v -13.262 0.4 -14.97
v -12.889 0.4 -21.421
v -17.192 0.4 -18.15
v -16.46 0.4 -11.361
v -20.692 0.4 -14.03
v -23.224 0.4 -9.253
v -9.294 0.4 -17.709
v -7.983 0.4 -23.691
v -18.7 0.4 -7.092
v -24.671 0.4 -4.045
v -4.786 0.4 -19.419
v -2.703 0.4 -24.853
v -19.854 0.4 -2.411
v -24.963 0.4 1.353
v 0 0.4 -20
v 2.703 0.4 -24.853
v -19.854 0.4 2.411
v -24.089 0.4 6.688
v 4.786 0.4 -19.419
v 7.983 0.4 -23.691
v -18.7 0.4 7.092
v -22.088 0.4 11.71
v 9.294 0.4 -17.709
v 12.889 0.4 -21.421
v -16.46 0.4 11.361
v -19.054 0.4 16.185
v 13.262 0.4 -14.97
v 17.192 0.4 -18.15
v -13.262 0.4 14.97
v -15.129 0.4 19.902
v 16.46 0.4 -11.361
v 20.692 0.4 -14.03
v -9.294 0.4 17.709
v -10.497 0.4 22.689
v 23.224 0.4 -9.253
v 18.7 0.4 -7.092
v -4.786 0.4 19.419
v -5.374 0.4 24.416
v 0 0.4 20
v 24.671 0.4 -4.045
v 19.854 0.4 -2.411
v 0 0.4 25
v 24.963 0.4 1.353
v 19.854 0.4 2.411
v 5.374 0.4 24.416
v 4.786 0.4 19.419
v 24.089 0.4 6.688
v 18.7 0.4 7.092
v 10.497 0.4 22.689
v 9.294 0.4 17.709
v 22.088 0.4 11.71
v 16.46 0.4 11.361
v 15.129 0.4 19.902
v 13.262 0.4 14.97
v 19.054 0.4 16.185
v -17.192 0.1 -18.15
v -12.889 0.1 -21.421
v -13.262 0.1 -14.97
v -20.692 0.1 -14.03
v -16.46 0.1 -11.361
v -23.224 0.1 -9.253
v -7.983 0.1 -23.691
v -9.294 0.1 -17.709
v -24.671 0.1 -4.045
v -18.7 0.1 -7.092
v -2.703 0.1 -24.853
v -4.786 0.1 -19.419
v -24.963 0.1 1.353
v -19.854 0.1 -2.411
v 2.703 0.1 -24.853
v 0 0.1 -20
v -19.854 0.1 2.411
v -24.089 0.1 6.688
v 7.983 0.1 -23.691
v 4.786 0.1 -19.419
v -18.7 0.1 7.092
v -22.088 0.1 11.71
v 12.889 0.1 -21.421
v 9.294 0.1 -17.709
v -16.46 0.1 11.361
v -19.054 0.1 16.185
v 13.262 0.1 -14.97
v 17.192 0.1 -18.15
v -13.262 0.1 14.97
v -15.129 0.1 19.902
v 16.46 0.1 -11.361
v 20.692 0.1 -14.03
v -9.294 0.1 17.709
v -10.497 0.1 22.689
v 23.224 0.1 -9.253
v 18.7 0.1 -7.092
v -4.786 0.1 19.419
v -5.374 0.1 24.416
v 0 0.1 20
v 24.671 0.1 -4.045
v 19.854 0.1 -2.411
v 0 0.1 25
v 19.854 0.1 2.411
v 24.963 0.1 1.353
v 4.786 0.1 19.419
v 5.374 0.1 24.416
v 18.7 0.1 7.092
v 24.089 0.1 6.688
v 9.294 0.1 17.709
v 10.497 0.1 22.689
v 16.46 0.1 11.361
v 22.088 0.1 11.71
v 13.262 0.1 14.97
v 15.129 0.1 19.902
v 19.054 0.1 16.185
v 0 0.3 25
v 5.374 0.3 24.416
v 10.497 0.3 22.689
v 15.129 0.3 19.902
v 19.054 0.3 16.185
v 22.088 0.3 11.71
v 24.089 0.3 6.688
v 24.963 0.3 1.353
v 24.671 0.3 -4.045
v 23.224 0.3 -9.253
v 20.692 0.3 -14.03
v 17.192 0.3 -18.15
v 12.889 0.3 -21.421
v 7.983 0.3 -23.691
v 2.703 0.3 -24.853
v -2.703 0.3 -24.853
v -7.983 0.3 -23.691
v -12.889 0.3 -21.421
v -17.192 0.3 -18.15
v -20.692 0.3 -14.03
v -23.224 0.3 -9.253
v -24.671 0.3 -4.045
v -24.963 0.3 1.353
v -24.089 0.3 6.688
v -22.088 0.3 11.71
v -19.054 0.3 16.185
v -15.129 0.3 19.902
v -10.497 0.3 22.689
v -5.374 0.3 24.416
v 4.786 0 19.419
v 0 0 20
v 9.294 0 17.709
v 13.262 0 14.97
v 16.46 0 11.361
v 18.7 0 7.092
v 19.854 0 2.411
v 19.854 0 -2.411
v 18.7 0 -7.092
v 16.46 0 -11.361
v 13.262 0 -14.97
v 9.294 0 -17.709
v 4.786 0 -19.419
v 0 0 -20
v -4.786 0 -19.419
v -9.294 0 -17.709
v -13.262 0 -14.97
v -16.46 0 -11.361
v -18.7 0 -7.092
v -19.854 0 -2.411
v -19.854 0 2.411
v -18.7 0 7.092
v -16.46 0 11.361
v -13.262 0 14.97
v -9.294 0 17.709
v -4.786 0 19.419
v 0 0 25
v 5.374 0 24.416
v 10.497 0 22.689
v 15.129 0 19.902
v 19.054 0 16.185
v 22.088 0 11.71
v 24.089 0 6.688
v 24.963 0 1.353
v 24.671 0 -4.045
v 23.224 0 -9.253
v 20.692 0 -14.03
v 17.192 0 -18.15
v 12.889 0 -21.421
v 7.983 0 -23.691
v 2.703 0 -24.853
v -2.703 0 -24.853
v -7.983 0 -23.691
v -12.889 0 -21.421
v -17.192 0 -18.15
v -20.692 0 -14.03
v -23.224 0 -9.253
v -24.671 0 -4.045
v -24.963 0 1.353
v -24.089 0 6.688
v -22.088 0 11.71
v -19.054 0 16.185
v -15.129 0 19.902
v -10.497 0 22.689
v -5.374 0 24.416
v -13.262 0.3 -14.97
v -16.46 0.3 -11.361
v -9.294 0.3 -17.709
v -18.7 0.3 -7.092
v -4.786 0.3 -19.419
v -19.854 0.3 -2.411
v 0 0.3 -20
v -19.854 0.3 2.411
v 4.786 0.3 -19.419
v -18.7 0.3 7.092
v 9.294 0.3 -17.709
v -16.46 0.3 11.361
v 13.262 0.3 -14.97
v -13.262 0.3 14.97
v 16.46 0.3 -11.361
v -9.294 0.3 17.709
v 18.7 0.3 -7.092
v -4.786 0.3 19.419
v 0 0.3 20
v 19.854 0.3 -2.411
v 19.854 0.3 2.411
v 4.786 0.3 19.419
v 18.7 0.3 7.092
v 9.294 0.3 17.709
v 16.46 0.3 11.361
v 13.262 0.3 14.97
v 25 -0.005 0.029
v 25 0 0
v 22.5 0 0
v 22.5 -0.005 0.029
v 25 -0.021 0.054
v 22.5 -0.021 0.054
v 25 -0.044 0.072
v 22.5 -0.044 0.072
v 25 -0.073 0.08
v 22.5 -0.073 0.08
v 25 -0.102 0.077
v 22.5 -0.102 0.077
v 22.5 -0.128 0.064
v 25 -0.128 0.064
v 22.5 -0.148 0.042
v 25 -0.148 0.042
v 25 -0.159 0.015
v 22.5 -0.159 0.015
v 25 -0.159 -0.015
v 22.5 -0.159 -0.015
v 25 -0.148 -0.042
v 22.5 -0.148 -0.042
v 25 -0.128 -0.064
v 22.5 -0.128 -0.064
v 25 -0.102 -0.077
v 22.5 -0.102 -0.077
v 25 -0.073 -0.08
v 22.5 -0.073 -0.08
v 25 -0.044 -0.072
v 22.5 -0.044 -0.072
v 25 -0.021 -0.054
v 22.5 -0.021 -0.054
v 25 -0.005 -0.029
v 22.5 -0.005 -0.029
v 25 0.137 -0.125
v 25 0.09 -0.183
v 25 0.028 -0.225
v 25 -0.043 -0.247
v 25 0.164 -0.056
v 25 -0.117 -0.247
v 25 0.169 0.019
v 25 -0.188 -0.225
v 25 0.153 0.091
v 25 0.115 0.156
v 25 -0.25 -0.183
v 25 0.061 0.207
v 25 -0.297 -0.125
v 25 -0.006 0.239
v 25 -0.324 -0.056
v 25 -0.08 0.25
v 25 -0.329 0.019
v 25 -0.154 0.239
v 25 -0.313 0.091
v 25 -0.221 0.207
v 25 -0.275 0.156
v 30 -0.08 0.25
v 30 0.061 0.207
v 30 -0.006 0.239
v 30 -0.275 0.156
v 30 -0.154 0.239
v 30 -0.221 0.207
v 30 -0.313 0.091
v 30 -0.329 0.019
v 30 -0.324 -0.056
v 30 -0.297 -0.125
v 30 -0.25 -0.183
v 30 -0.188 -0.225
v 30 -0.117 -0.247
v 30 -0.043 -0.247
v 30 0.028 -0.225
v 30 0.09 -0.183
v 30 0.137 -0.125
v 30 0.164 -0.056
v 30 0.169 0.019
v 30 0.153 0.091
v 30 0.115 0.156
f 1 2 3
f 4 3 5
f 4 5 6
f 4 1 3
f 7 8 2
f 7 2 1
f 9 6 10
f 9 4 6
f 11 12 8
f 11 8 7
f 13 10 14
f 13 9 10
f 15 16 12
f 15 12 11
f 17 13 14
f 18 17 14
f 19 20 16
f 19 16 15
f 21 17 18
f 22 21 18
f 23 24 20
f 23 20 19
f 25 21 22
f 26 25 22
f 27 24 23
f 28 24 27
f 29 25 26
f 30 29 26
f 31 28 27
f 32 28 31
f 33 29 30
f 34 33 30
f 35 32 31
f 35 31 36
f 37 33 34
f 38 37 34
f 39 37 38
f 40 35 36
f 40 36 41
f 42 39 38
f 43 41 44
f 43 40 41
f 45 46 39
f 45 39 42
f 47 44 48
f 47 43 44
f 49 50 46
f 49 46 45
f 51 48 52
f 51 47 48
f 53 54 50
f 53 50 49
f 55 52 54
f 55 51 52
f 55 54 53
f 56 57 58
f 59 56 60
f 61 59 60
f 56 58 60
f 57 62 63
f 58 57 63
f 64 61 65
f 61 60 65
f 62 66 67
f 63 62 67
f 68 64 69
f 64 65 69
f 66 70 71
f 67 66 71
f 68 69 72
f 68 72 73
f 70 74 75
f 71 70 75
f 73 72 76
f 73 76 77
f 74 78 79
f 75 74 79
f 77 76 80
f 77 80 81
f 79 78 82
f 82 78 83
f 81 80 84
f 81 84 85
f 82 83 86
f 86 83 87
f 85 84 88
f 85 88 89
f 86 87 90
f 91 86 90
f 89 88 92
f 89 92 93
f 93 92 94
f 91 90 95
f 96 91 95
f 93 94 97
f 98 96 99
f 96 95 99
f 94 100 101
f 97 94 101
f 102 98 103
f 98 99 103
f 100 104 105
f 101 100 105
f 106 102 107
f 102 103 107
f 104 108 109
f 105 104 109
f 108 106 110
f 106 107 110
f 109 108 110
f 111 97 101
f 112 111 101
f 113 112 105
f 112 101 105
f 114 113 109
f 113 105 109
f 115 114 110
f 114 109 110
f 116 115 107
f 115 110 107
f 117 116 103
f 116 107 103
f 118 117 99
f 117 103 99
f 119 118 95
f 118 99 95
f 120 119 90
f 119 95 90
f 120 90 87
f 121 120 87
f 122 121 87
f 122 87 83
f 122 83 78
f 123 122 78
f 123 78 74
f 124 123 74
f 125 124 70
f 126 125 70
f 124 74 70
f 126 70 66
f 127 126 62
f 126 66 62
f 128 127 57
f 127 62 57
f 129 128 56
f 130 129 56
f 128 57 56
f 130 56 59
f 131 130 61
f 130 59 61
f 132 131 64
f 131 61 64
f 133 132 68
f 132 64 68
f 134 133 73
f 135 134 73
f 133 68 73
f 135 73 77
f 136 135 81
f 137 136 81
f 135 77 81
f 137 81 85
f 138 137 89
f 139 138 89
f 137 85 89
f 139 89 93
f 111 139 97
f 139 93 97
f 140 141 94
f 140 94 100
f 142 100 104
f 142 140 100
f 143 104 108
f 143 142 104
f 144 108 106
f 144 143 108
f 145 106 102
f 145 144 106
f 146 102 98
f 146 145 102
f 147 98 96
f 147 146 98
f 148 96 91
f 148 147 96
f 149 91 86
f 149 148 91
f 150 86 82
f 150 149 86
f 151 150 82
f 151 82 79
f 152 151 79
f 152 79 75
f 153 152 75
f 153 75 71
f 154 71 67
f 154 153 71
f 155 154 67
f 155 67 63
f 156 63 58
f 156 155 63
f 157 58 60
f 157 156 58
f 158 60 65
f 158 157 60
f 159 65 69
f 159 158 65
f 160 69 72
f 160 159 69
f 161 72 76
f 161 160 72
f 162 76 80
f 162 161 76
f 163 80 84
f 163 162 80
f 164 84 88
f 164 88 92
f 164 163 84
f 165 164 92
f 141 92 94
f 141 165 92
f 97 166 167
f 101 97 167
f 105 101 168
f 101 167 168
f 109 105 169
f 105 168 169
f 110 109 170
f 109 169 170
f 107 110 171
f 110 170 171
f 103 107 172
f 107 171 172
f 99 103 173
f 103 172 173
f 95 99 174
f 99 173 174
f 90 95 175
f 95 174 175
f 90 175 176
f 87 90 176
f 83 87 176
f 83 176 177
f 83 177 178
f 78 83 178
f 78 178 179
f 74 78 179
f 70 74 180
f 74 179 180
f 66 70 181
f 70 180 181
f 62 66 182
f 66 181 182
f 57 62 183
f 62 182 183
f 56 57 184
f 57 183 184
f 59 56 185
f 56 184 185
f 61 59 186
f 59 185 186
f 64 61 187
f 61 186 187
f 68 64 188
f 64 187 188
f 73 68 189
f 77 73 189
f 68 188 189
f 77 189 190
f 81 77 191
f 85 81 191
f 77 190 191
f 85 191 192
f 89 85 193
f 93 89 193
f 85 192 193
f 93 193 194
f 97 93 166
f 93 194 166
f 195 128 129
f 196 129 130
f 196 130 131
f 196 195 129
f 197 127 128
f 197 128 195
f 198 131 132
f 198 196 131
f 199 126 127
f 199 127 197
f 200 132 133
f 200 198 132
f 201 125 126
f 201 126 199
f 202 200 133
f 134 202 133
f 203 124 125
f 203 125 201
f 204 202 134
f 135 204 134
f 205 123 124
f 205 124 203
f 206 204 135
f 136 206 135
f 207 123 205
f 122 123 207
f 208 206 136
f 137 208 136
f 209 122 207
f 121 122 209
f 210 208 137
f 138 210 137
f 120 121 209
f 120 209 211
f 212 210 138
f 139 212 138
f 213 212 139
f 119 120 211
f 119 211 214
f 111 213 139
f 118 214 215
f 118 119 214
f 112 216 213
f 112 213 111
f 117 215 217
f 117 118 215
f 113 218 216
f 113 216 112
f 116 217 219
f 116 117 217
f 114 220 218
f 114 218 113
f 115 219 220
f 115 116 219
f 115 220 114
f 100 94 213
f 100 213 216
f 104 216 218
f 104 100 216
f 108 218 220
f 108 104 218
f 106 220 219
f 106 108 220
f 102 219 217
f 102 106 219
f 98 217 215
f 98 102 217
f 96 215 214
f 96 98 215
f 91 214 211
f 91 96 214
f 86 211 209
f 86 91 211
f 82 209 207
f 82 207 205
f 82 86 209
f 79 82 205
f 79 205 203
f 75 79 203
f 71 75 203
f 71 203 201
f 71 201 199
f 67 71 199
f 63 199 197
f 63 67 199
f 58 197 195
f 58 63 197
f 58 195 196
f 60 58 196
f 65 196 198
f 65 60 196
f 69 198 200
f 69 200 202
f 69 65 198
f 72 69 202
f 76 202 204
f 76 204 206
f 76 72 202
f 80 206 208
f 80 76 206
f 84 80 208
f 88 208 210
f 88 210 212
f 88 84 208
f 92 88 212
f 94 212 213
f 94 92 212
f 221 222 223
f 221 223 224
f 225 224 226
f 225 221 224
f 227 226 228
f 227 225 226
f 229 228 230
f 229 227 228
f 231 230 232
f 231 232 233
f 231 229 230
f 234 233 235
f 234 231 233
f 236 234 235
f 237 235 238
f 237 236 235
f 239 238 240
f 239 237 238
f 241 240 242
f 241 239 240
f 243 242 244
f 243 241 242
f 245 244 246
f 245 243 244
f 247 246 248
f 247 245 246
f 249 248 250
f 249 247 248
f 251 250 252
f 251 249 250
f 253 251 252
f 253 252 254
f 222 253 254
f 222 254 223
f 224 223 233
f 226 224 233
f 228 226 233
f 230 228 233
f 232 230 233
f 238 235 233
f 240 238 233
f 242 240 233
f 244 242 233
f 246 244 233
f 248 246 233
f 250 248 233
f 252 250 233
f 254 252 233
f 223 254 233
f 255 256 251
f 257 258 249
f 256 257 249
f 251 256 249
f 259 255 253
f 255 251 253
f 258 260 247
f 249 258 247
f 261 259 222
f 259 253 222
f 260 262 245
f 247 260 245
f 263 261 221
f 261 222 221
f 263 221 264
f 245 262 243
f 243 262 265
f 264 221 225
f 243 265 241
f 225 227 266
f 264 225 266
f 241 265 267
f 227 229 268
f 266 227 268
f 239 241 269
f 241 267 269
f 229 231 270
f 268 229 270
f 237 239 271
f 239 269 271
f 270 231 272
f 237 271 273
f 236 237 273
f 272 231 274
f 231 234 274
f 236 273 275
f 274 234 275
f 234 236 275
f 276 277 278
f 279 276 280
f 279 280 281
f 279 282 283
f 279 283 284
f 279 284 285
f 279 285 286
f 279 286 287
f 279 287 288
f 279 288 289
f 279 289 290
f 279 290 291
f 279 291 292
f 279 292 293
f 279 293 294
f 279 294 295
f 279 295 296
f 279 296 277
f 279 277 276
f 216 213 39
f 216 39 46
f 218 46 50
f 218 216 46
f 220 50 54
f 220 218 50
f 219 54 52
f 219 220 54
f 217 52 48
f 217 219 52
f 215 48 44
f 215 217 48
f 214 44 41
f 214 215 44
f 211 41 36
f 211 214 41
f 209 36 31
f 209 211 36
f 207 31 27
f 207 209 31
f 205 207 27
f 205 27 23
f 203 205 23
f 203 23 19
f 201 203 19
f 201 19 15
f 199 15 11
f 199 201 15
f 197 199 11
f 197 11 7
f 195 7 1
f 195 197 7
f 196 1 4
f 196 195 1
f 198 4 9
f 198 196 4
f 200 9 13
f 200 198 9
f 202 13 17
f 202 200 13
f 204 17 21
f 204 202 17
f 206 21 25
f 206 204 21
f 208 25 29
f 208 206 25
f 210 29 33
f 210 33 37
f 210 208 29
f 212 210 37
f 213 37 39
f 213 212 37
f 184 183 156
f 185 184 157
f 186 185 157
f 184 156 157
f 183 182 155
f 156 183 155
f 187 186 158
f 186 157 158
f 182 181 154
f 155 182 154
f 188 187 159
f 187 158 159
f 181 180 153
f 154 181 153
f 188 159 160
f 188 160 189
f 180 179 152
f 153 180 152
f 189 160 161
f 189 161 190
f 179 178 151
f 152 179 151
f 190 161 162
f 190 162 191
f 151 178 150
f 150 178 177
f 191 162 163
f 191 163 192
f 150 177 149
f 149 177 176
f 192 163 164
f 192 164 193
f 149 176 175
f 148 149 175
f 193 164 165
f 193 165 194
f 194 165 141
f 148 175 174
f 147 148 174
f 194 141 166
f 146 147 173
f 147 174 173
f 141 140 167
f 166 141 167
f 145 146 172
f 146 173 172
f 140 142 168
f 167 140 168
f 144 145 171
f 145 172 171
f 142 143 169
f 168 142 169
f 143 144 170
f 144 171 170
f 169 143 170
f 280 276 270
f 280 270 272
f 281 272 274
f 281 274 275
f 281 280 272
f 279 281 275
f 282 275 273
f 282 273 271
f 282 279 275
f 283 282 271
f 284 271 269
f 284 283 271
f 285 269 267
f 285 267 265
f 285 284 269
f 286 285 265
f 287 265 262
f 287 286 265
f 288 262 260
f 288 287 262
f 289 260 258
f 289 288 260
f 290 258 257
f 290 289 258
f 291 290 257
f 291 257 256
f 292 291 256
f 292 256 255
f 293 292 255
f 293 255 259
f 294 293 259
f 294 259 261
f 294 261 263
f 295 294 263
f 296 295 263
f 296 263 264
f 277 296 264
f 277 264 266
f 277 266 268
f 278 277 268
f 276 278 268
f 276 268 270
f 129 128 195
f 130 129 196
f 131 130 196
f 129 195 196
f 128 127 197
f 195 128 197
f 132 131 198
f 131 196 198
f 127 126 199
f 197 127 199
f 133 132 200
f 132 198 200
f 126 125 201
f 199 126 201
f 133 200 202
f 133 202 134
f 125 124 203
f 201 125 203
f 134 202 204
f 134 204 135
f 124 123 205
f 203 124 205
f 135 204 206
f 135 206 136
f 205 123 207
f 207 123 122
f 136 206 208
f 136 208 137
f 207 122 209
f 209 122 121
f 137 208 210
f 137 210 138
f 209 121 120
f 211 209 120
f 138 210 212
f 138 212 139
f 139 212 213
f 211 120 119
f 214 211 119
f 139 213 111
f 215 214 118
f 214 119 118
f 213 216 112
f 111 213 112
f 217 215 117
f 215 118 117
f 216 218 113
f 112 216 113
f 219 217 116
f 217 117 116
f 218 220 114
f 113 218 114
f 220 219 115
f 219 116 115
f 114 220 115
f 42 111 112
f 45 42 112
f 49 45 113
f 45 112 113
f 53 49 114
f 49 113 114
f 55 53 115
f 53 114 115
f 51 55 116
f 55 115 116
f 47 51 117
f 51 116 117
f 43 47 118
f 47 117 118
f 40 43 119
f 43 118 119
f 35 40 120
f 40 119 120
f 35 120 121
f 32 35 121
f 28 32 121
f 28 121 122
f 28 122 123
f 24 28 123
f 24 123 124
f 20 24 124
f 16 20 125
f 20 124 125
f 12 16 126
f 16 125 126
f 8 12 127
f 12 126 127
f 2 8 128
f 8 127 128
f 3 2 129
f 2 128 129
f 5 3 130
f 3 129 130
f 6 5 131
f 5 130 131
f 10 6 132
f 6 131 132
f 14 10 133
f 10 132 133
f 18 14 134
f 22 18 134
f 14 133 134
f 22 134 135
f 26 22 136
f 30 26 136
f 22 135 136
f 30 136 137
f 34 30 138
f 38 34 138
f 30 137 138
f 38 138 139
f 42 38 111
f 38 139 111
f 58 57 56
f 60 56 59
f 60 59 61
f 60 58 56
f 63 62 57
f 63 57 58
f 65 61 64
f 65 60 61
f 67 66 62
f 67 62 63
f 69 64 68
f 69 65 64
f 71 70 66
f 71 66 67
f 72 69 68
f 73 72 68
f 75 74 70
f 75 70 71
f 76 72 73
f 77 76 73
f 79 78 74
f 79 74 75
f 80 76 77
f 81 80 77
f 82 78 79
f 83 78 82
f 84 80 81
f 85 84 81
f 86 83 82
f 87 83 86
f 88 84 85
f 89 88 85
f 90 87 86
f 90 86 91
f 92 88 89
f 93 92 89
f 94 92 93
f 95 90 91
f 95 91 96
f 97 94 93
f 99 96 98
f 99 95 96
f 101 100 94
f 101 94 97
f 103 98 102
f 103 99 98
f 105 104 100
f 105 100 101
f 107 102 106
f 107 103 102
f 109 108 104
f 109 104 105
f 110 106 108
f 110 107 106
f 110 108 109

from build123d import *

# Parameters (mm, degrees)
SKETCH1_R           = 25
SKETCH1_R_2         = 20
BOSS_EXTRUDE1_DEPTH = 0.1
SWEEP1_PROFILE_R    = 0.08
SWEEP2_PROFILE_R    = 0.25
SKETCH18_R          = 25
SKETCH18_R_2        = 20
BOSS_EXTRUDE2_DEPTH = 0.2
SKETCH19_R          = 25
SKETCH19_R_2        = 20
BOSS_EXTRUDE3_DEPTH = 0.1


with BuildPart() as part:
    # Sketch1 → Boss-Extrude1 (new body)
    with BuildSketch(Plane(origin=(0, 0, 0), x_dir=(1, 0, 0), z_dir=(0, 1, 0))):
        with Locations(Location((0, 0, 0), (0, 0, 270))):
            Circle(SKETCH1_R)
        with Locations(Location((0, 0, 0), (0, 0, 270))):
            Circle(SKETCH1_R_2, mode=Mode.SUBTRACT)
    extrude(amount=BOSS_EXTRUDE1_DEPTH)


with BuildPart() as body_2:
    # Sweep1: sweep along a path in Sketch2
    with BuildLine(Plane.XY) as sweep1_path:
        Line((22.5, -0.08), (25, -0.08))
    # Sweep1 profile (on start of the path) → Sweep1 (sweep)
    with BuildSketch(Plane(origin=(22.5, -0.08, 0), x_dir=(0, 1, 0), z_dir=(1, 0, 0))):
        Circle(SWEEP1_PROFILE_R)
    sweep(path=sweep1_path.line)

    # Sweep2: sweep along a path in Sketch11
    with BuildLine(Plane.XY) as sweep2_path:
        Line((25, -0.08), (30, -0.08))
    # Sweep2 profile (on start of the path) → Sweep2 (sweep)
    with BuildSketch(Plane(origin=(25, -0.08, 0), x_dir=(0, 0, 1), z_dir=(1, 0, 0))):
        Circle(SWEEP2_PROFILE_R)
    sweep(path=sweep2_path.line)


with BuildPart() as body_3:
    # Sketch18 → Boss-Extrude2 (new body)
    with BuildSketch(Plane(origin=(0, 0.1, 0), x_dir=(1, 0, 0), z_dir=(0, 1, 0))):
        with Locations(Location((0, 0, 0), (0, 0, 270))):
            Circle(SKETCH18_R)
        with Locations(Location((0, 0, 0), (0, 0, 270))):
            Circle(SKETCH18_R_2, mode=Mode.SUBTRACT)
    extrude(amount=BOSS_EXTRUDE2_DEPTH)


with BuildPart() as body_4:
    # Sketch19 → Boss-Extrude3 (new body)
    with BuildSketch(Plane(origin=(0, 0.3, 0), x_dir=(1, 0, 0), z_dir=(0, 1, 0))):
        with Locations(Location((0, 0, 0), (0, 0, 270))):
            Circle(SKETCH19_R)
        with Locations(Location((0, 0, 0), (0, 0, 270))):
            Circle(SKETCH19_R_2, mode=Mode.SUBTRACT)
    extrude(amount=BOSS_EXTRUDE3_DEPTH)


solid = Compound([part.part, body_2.part, body_3.part, body_4.part])
